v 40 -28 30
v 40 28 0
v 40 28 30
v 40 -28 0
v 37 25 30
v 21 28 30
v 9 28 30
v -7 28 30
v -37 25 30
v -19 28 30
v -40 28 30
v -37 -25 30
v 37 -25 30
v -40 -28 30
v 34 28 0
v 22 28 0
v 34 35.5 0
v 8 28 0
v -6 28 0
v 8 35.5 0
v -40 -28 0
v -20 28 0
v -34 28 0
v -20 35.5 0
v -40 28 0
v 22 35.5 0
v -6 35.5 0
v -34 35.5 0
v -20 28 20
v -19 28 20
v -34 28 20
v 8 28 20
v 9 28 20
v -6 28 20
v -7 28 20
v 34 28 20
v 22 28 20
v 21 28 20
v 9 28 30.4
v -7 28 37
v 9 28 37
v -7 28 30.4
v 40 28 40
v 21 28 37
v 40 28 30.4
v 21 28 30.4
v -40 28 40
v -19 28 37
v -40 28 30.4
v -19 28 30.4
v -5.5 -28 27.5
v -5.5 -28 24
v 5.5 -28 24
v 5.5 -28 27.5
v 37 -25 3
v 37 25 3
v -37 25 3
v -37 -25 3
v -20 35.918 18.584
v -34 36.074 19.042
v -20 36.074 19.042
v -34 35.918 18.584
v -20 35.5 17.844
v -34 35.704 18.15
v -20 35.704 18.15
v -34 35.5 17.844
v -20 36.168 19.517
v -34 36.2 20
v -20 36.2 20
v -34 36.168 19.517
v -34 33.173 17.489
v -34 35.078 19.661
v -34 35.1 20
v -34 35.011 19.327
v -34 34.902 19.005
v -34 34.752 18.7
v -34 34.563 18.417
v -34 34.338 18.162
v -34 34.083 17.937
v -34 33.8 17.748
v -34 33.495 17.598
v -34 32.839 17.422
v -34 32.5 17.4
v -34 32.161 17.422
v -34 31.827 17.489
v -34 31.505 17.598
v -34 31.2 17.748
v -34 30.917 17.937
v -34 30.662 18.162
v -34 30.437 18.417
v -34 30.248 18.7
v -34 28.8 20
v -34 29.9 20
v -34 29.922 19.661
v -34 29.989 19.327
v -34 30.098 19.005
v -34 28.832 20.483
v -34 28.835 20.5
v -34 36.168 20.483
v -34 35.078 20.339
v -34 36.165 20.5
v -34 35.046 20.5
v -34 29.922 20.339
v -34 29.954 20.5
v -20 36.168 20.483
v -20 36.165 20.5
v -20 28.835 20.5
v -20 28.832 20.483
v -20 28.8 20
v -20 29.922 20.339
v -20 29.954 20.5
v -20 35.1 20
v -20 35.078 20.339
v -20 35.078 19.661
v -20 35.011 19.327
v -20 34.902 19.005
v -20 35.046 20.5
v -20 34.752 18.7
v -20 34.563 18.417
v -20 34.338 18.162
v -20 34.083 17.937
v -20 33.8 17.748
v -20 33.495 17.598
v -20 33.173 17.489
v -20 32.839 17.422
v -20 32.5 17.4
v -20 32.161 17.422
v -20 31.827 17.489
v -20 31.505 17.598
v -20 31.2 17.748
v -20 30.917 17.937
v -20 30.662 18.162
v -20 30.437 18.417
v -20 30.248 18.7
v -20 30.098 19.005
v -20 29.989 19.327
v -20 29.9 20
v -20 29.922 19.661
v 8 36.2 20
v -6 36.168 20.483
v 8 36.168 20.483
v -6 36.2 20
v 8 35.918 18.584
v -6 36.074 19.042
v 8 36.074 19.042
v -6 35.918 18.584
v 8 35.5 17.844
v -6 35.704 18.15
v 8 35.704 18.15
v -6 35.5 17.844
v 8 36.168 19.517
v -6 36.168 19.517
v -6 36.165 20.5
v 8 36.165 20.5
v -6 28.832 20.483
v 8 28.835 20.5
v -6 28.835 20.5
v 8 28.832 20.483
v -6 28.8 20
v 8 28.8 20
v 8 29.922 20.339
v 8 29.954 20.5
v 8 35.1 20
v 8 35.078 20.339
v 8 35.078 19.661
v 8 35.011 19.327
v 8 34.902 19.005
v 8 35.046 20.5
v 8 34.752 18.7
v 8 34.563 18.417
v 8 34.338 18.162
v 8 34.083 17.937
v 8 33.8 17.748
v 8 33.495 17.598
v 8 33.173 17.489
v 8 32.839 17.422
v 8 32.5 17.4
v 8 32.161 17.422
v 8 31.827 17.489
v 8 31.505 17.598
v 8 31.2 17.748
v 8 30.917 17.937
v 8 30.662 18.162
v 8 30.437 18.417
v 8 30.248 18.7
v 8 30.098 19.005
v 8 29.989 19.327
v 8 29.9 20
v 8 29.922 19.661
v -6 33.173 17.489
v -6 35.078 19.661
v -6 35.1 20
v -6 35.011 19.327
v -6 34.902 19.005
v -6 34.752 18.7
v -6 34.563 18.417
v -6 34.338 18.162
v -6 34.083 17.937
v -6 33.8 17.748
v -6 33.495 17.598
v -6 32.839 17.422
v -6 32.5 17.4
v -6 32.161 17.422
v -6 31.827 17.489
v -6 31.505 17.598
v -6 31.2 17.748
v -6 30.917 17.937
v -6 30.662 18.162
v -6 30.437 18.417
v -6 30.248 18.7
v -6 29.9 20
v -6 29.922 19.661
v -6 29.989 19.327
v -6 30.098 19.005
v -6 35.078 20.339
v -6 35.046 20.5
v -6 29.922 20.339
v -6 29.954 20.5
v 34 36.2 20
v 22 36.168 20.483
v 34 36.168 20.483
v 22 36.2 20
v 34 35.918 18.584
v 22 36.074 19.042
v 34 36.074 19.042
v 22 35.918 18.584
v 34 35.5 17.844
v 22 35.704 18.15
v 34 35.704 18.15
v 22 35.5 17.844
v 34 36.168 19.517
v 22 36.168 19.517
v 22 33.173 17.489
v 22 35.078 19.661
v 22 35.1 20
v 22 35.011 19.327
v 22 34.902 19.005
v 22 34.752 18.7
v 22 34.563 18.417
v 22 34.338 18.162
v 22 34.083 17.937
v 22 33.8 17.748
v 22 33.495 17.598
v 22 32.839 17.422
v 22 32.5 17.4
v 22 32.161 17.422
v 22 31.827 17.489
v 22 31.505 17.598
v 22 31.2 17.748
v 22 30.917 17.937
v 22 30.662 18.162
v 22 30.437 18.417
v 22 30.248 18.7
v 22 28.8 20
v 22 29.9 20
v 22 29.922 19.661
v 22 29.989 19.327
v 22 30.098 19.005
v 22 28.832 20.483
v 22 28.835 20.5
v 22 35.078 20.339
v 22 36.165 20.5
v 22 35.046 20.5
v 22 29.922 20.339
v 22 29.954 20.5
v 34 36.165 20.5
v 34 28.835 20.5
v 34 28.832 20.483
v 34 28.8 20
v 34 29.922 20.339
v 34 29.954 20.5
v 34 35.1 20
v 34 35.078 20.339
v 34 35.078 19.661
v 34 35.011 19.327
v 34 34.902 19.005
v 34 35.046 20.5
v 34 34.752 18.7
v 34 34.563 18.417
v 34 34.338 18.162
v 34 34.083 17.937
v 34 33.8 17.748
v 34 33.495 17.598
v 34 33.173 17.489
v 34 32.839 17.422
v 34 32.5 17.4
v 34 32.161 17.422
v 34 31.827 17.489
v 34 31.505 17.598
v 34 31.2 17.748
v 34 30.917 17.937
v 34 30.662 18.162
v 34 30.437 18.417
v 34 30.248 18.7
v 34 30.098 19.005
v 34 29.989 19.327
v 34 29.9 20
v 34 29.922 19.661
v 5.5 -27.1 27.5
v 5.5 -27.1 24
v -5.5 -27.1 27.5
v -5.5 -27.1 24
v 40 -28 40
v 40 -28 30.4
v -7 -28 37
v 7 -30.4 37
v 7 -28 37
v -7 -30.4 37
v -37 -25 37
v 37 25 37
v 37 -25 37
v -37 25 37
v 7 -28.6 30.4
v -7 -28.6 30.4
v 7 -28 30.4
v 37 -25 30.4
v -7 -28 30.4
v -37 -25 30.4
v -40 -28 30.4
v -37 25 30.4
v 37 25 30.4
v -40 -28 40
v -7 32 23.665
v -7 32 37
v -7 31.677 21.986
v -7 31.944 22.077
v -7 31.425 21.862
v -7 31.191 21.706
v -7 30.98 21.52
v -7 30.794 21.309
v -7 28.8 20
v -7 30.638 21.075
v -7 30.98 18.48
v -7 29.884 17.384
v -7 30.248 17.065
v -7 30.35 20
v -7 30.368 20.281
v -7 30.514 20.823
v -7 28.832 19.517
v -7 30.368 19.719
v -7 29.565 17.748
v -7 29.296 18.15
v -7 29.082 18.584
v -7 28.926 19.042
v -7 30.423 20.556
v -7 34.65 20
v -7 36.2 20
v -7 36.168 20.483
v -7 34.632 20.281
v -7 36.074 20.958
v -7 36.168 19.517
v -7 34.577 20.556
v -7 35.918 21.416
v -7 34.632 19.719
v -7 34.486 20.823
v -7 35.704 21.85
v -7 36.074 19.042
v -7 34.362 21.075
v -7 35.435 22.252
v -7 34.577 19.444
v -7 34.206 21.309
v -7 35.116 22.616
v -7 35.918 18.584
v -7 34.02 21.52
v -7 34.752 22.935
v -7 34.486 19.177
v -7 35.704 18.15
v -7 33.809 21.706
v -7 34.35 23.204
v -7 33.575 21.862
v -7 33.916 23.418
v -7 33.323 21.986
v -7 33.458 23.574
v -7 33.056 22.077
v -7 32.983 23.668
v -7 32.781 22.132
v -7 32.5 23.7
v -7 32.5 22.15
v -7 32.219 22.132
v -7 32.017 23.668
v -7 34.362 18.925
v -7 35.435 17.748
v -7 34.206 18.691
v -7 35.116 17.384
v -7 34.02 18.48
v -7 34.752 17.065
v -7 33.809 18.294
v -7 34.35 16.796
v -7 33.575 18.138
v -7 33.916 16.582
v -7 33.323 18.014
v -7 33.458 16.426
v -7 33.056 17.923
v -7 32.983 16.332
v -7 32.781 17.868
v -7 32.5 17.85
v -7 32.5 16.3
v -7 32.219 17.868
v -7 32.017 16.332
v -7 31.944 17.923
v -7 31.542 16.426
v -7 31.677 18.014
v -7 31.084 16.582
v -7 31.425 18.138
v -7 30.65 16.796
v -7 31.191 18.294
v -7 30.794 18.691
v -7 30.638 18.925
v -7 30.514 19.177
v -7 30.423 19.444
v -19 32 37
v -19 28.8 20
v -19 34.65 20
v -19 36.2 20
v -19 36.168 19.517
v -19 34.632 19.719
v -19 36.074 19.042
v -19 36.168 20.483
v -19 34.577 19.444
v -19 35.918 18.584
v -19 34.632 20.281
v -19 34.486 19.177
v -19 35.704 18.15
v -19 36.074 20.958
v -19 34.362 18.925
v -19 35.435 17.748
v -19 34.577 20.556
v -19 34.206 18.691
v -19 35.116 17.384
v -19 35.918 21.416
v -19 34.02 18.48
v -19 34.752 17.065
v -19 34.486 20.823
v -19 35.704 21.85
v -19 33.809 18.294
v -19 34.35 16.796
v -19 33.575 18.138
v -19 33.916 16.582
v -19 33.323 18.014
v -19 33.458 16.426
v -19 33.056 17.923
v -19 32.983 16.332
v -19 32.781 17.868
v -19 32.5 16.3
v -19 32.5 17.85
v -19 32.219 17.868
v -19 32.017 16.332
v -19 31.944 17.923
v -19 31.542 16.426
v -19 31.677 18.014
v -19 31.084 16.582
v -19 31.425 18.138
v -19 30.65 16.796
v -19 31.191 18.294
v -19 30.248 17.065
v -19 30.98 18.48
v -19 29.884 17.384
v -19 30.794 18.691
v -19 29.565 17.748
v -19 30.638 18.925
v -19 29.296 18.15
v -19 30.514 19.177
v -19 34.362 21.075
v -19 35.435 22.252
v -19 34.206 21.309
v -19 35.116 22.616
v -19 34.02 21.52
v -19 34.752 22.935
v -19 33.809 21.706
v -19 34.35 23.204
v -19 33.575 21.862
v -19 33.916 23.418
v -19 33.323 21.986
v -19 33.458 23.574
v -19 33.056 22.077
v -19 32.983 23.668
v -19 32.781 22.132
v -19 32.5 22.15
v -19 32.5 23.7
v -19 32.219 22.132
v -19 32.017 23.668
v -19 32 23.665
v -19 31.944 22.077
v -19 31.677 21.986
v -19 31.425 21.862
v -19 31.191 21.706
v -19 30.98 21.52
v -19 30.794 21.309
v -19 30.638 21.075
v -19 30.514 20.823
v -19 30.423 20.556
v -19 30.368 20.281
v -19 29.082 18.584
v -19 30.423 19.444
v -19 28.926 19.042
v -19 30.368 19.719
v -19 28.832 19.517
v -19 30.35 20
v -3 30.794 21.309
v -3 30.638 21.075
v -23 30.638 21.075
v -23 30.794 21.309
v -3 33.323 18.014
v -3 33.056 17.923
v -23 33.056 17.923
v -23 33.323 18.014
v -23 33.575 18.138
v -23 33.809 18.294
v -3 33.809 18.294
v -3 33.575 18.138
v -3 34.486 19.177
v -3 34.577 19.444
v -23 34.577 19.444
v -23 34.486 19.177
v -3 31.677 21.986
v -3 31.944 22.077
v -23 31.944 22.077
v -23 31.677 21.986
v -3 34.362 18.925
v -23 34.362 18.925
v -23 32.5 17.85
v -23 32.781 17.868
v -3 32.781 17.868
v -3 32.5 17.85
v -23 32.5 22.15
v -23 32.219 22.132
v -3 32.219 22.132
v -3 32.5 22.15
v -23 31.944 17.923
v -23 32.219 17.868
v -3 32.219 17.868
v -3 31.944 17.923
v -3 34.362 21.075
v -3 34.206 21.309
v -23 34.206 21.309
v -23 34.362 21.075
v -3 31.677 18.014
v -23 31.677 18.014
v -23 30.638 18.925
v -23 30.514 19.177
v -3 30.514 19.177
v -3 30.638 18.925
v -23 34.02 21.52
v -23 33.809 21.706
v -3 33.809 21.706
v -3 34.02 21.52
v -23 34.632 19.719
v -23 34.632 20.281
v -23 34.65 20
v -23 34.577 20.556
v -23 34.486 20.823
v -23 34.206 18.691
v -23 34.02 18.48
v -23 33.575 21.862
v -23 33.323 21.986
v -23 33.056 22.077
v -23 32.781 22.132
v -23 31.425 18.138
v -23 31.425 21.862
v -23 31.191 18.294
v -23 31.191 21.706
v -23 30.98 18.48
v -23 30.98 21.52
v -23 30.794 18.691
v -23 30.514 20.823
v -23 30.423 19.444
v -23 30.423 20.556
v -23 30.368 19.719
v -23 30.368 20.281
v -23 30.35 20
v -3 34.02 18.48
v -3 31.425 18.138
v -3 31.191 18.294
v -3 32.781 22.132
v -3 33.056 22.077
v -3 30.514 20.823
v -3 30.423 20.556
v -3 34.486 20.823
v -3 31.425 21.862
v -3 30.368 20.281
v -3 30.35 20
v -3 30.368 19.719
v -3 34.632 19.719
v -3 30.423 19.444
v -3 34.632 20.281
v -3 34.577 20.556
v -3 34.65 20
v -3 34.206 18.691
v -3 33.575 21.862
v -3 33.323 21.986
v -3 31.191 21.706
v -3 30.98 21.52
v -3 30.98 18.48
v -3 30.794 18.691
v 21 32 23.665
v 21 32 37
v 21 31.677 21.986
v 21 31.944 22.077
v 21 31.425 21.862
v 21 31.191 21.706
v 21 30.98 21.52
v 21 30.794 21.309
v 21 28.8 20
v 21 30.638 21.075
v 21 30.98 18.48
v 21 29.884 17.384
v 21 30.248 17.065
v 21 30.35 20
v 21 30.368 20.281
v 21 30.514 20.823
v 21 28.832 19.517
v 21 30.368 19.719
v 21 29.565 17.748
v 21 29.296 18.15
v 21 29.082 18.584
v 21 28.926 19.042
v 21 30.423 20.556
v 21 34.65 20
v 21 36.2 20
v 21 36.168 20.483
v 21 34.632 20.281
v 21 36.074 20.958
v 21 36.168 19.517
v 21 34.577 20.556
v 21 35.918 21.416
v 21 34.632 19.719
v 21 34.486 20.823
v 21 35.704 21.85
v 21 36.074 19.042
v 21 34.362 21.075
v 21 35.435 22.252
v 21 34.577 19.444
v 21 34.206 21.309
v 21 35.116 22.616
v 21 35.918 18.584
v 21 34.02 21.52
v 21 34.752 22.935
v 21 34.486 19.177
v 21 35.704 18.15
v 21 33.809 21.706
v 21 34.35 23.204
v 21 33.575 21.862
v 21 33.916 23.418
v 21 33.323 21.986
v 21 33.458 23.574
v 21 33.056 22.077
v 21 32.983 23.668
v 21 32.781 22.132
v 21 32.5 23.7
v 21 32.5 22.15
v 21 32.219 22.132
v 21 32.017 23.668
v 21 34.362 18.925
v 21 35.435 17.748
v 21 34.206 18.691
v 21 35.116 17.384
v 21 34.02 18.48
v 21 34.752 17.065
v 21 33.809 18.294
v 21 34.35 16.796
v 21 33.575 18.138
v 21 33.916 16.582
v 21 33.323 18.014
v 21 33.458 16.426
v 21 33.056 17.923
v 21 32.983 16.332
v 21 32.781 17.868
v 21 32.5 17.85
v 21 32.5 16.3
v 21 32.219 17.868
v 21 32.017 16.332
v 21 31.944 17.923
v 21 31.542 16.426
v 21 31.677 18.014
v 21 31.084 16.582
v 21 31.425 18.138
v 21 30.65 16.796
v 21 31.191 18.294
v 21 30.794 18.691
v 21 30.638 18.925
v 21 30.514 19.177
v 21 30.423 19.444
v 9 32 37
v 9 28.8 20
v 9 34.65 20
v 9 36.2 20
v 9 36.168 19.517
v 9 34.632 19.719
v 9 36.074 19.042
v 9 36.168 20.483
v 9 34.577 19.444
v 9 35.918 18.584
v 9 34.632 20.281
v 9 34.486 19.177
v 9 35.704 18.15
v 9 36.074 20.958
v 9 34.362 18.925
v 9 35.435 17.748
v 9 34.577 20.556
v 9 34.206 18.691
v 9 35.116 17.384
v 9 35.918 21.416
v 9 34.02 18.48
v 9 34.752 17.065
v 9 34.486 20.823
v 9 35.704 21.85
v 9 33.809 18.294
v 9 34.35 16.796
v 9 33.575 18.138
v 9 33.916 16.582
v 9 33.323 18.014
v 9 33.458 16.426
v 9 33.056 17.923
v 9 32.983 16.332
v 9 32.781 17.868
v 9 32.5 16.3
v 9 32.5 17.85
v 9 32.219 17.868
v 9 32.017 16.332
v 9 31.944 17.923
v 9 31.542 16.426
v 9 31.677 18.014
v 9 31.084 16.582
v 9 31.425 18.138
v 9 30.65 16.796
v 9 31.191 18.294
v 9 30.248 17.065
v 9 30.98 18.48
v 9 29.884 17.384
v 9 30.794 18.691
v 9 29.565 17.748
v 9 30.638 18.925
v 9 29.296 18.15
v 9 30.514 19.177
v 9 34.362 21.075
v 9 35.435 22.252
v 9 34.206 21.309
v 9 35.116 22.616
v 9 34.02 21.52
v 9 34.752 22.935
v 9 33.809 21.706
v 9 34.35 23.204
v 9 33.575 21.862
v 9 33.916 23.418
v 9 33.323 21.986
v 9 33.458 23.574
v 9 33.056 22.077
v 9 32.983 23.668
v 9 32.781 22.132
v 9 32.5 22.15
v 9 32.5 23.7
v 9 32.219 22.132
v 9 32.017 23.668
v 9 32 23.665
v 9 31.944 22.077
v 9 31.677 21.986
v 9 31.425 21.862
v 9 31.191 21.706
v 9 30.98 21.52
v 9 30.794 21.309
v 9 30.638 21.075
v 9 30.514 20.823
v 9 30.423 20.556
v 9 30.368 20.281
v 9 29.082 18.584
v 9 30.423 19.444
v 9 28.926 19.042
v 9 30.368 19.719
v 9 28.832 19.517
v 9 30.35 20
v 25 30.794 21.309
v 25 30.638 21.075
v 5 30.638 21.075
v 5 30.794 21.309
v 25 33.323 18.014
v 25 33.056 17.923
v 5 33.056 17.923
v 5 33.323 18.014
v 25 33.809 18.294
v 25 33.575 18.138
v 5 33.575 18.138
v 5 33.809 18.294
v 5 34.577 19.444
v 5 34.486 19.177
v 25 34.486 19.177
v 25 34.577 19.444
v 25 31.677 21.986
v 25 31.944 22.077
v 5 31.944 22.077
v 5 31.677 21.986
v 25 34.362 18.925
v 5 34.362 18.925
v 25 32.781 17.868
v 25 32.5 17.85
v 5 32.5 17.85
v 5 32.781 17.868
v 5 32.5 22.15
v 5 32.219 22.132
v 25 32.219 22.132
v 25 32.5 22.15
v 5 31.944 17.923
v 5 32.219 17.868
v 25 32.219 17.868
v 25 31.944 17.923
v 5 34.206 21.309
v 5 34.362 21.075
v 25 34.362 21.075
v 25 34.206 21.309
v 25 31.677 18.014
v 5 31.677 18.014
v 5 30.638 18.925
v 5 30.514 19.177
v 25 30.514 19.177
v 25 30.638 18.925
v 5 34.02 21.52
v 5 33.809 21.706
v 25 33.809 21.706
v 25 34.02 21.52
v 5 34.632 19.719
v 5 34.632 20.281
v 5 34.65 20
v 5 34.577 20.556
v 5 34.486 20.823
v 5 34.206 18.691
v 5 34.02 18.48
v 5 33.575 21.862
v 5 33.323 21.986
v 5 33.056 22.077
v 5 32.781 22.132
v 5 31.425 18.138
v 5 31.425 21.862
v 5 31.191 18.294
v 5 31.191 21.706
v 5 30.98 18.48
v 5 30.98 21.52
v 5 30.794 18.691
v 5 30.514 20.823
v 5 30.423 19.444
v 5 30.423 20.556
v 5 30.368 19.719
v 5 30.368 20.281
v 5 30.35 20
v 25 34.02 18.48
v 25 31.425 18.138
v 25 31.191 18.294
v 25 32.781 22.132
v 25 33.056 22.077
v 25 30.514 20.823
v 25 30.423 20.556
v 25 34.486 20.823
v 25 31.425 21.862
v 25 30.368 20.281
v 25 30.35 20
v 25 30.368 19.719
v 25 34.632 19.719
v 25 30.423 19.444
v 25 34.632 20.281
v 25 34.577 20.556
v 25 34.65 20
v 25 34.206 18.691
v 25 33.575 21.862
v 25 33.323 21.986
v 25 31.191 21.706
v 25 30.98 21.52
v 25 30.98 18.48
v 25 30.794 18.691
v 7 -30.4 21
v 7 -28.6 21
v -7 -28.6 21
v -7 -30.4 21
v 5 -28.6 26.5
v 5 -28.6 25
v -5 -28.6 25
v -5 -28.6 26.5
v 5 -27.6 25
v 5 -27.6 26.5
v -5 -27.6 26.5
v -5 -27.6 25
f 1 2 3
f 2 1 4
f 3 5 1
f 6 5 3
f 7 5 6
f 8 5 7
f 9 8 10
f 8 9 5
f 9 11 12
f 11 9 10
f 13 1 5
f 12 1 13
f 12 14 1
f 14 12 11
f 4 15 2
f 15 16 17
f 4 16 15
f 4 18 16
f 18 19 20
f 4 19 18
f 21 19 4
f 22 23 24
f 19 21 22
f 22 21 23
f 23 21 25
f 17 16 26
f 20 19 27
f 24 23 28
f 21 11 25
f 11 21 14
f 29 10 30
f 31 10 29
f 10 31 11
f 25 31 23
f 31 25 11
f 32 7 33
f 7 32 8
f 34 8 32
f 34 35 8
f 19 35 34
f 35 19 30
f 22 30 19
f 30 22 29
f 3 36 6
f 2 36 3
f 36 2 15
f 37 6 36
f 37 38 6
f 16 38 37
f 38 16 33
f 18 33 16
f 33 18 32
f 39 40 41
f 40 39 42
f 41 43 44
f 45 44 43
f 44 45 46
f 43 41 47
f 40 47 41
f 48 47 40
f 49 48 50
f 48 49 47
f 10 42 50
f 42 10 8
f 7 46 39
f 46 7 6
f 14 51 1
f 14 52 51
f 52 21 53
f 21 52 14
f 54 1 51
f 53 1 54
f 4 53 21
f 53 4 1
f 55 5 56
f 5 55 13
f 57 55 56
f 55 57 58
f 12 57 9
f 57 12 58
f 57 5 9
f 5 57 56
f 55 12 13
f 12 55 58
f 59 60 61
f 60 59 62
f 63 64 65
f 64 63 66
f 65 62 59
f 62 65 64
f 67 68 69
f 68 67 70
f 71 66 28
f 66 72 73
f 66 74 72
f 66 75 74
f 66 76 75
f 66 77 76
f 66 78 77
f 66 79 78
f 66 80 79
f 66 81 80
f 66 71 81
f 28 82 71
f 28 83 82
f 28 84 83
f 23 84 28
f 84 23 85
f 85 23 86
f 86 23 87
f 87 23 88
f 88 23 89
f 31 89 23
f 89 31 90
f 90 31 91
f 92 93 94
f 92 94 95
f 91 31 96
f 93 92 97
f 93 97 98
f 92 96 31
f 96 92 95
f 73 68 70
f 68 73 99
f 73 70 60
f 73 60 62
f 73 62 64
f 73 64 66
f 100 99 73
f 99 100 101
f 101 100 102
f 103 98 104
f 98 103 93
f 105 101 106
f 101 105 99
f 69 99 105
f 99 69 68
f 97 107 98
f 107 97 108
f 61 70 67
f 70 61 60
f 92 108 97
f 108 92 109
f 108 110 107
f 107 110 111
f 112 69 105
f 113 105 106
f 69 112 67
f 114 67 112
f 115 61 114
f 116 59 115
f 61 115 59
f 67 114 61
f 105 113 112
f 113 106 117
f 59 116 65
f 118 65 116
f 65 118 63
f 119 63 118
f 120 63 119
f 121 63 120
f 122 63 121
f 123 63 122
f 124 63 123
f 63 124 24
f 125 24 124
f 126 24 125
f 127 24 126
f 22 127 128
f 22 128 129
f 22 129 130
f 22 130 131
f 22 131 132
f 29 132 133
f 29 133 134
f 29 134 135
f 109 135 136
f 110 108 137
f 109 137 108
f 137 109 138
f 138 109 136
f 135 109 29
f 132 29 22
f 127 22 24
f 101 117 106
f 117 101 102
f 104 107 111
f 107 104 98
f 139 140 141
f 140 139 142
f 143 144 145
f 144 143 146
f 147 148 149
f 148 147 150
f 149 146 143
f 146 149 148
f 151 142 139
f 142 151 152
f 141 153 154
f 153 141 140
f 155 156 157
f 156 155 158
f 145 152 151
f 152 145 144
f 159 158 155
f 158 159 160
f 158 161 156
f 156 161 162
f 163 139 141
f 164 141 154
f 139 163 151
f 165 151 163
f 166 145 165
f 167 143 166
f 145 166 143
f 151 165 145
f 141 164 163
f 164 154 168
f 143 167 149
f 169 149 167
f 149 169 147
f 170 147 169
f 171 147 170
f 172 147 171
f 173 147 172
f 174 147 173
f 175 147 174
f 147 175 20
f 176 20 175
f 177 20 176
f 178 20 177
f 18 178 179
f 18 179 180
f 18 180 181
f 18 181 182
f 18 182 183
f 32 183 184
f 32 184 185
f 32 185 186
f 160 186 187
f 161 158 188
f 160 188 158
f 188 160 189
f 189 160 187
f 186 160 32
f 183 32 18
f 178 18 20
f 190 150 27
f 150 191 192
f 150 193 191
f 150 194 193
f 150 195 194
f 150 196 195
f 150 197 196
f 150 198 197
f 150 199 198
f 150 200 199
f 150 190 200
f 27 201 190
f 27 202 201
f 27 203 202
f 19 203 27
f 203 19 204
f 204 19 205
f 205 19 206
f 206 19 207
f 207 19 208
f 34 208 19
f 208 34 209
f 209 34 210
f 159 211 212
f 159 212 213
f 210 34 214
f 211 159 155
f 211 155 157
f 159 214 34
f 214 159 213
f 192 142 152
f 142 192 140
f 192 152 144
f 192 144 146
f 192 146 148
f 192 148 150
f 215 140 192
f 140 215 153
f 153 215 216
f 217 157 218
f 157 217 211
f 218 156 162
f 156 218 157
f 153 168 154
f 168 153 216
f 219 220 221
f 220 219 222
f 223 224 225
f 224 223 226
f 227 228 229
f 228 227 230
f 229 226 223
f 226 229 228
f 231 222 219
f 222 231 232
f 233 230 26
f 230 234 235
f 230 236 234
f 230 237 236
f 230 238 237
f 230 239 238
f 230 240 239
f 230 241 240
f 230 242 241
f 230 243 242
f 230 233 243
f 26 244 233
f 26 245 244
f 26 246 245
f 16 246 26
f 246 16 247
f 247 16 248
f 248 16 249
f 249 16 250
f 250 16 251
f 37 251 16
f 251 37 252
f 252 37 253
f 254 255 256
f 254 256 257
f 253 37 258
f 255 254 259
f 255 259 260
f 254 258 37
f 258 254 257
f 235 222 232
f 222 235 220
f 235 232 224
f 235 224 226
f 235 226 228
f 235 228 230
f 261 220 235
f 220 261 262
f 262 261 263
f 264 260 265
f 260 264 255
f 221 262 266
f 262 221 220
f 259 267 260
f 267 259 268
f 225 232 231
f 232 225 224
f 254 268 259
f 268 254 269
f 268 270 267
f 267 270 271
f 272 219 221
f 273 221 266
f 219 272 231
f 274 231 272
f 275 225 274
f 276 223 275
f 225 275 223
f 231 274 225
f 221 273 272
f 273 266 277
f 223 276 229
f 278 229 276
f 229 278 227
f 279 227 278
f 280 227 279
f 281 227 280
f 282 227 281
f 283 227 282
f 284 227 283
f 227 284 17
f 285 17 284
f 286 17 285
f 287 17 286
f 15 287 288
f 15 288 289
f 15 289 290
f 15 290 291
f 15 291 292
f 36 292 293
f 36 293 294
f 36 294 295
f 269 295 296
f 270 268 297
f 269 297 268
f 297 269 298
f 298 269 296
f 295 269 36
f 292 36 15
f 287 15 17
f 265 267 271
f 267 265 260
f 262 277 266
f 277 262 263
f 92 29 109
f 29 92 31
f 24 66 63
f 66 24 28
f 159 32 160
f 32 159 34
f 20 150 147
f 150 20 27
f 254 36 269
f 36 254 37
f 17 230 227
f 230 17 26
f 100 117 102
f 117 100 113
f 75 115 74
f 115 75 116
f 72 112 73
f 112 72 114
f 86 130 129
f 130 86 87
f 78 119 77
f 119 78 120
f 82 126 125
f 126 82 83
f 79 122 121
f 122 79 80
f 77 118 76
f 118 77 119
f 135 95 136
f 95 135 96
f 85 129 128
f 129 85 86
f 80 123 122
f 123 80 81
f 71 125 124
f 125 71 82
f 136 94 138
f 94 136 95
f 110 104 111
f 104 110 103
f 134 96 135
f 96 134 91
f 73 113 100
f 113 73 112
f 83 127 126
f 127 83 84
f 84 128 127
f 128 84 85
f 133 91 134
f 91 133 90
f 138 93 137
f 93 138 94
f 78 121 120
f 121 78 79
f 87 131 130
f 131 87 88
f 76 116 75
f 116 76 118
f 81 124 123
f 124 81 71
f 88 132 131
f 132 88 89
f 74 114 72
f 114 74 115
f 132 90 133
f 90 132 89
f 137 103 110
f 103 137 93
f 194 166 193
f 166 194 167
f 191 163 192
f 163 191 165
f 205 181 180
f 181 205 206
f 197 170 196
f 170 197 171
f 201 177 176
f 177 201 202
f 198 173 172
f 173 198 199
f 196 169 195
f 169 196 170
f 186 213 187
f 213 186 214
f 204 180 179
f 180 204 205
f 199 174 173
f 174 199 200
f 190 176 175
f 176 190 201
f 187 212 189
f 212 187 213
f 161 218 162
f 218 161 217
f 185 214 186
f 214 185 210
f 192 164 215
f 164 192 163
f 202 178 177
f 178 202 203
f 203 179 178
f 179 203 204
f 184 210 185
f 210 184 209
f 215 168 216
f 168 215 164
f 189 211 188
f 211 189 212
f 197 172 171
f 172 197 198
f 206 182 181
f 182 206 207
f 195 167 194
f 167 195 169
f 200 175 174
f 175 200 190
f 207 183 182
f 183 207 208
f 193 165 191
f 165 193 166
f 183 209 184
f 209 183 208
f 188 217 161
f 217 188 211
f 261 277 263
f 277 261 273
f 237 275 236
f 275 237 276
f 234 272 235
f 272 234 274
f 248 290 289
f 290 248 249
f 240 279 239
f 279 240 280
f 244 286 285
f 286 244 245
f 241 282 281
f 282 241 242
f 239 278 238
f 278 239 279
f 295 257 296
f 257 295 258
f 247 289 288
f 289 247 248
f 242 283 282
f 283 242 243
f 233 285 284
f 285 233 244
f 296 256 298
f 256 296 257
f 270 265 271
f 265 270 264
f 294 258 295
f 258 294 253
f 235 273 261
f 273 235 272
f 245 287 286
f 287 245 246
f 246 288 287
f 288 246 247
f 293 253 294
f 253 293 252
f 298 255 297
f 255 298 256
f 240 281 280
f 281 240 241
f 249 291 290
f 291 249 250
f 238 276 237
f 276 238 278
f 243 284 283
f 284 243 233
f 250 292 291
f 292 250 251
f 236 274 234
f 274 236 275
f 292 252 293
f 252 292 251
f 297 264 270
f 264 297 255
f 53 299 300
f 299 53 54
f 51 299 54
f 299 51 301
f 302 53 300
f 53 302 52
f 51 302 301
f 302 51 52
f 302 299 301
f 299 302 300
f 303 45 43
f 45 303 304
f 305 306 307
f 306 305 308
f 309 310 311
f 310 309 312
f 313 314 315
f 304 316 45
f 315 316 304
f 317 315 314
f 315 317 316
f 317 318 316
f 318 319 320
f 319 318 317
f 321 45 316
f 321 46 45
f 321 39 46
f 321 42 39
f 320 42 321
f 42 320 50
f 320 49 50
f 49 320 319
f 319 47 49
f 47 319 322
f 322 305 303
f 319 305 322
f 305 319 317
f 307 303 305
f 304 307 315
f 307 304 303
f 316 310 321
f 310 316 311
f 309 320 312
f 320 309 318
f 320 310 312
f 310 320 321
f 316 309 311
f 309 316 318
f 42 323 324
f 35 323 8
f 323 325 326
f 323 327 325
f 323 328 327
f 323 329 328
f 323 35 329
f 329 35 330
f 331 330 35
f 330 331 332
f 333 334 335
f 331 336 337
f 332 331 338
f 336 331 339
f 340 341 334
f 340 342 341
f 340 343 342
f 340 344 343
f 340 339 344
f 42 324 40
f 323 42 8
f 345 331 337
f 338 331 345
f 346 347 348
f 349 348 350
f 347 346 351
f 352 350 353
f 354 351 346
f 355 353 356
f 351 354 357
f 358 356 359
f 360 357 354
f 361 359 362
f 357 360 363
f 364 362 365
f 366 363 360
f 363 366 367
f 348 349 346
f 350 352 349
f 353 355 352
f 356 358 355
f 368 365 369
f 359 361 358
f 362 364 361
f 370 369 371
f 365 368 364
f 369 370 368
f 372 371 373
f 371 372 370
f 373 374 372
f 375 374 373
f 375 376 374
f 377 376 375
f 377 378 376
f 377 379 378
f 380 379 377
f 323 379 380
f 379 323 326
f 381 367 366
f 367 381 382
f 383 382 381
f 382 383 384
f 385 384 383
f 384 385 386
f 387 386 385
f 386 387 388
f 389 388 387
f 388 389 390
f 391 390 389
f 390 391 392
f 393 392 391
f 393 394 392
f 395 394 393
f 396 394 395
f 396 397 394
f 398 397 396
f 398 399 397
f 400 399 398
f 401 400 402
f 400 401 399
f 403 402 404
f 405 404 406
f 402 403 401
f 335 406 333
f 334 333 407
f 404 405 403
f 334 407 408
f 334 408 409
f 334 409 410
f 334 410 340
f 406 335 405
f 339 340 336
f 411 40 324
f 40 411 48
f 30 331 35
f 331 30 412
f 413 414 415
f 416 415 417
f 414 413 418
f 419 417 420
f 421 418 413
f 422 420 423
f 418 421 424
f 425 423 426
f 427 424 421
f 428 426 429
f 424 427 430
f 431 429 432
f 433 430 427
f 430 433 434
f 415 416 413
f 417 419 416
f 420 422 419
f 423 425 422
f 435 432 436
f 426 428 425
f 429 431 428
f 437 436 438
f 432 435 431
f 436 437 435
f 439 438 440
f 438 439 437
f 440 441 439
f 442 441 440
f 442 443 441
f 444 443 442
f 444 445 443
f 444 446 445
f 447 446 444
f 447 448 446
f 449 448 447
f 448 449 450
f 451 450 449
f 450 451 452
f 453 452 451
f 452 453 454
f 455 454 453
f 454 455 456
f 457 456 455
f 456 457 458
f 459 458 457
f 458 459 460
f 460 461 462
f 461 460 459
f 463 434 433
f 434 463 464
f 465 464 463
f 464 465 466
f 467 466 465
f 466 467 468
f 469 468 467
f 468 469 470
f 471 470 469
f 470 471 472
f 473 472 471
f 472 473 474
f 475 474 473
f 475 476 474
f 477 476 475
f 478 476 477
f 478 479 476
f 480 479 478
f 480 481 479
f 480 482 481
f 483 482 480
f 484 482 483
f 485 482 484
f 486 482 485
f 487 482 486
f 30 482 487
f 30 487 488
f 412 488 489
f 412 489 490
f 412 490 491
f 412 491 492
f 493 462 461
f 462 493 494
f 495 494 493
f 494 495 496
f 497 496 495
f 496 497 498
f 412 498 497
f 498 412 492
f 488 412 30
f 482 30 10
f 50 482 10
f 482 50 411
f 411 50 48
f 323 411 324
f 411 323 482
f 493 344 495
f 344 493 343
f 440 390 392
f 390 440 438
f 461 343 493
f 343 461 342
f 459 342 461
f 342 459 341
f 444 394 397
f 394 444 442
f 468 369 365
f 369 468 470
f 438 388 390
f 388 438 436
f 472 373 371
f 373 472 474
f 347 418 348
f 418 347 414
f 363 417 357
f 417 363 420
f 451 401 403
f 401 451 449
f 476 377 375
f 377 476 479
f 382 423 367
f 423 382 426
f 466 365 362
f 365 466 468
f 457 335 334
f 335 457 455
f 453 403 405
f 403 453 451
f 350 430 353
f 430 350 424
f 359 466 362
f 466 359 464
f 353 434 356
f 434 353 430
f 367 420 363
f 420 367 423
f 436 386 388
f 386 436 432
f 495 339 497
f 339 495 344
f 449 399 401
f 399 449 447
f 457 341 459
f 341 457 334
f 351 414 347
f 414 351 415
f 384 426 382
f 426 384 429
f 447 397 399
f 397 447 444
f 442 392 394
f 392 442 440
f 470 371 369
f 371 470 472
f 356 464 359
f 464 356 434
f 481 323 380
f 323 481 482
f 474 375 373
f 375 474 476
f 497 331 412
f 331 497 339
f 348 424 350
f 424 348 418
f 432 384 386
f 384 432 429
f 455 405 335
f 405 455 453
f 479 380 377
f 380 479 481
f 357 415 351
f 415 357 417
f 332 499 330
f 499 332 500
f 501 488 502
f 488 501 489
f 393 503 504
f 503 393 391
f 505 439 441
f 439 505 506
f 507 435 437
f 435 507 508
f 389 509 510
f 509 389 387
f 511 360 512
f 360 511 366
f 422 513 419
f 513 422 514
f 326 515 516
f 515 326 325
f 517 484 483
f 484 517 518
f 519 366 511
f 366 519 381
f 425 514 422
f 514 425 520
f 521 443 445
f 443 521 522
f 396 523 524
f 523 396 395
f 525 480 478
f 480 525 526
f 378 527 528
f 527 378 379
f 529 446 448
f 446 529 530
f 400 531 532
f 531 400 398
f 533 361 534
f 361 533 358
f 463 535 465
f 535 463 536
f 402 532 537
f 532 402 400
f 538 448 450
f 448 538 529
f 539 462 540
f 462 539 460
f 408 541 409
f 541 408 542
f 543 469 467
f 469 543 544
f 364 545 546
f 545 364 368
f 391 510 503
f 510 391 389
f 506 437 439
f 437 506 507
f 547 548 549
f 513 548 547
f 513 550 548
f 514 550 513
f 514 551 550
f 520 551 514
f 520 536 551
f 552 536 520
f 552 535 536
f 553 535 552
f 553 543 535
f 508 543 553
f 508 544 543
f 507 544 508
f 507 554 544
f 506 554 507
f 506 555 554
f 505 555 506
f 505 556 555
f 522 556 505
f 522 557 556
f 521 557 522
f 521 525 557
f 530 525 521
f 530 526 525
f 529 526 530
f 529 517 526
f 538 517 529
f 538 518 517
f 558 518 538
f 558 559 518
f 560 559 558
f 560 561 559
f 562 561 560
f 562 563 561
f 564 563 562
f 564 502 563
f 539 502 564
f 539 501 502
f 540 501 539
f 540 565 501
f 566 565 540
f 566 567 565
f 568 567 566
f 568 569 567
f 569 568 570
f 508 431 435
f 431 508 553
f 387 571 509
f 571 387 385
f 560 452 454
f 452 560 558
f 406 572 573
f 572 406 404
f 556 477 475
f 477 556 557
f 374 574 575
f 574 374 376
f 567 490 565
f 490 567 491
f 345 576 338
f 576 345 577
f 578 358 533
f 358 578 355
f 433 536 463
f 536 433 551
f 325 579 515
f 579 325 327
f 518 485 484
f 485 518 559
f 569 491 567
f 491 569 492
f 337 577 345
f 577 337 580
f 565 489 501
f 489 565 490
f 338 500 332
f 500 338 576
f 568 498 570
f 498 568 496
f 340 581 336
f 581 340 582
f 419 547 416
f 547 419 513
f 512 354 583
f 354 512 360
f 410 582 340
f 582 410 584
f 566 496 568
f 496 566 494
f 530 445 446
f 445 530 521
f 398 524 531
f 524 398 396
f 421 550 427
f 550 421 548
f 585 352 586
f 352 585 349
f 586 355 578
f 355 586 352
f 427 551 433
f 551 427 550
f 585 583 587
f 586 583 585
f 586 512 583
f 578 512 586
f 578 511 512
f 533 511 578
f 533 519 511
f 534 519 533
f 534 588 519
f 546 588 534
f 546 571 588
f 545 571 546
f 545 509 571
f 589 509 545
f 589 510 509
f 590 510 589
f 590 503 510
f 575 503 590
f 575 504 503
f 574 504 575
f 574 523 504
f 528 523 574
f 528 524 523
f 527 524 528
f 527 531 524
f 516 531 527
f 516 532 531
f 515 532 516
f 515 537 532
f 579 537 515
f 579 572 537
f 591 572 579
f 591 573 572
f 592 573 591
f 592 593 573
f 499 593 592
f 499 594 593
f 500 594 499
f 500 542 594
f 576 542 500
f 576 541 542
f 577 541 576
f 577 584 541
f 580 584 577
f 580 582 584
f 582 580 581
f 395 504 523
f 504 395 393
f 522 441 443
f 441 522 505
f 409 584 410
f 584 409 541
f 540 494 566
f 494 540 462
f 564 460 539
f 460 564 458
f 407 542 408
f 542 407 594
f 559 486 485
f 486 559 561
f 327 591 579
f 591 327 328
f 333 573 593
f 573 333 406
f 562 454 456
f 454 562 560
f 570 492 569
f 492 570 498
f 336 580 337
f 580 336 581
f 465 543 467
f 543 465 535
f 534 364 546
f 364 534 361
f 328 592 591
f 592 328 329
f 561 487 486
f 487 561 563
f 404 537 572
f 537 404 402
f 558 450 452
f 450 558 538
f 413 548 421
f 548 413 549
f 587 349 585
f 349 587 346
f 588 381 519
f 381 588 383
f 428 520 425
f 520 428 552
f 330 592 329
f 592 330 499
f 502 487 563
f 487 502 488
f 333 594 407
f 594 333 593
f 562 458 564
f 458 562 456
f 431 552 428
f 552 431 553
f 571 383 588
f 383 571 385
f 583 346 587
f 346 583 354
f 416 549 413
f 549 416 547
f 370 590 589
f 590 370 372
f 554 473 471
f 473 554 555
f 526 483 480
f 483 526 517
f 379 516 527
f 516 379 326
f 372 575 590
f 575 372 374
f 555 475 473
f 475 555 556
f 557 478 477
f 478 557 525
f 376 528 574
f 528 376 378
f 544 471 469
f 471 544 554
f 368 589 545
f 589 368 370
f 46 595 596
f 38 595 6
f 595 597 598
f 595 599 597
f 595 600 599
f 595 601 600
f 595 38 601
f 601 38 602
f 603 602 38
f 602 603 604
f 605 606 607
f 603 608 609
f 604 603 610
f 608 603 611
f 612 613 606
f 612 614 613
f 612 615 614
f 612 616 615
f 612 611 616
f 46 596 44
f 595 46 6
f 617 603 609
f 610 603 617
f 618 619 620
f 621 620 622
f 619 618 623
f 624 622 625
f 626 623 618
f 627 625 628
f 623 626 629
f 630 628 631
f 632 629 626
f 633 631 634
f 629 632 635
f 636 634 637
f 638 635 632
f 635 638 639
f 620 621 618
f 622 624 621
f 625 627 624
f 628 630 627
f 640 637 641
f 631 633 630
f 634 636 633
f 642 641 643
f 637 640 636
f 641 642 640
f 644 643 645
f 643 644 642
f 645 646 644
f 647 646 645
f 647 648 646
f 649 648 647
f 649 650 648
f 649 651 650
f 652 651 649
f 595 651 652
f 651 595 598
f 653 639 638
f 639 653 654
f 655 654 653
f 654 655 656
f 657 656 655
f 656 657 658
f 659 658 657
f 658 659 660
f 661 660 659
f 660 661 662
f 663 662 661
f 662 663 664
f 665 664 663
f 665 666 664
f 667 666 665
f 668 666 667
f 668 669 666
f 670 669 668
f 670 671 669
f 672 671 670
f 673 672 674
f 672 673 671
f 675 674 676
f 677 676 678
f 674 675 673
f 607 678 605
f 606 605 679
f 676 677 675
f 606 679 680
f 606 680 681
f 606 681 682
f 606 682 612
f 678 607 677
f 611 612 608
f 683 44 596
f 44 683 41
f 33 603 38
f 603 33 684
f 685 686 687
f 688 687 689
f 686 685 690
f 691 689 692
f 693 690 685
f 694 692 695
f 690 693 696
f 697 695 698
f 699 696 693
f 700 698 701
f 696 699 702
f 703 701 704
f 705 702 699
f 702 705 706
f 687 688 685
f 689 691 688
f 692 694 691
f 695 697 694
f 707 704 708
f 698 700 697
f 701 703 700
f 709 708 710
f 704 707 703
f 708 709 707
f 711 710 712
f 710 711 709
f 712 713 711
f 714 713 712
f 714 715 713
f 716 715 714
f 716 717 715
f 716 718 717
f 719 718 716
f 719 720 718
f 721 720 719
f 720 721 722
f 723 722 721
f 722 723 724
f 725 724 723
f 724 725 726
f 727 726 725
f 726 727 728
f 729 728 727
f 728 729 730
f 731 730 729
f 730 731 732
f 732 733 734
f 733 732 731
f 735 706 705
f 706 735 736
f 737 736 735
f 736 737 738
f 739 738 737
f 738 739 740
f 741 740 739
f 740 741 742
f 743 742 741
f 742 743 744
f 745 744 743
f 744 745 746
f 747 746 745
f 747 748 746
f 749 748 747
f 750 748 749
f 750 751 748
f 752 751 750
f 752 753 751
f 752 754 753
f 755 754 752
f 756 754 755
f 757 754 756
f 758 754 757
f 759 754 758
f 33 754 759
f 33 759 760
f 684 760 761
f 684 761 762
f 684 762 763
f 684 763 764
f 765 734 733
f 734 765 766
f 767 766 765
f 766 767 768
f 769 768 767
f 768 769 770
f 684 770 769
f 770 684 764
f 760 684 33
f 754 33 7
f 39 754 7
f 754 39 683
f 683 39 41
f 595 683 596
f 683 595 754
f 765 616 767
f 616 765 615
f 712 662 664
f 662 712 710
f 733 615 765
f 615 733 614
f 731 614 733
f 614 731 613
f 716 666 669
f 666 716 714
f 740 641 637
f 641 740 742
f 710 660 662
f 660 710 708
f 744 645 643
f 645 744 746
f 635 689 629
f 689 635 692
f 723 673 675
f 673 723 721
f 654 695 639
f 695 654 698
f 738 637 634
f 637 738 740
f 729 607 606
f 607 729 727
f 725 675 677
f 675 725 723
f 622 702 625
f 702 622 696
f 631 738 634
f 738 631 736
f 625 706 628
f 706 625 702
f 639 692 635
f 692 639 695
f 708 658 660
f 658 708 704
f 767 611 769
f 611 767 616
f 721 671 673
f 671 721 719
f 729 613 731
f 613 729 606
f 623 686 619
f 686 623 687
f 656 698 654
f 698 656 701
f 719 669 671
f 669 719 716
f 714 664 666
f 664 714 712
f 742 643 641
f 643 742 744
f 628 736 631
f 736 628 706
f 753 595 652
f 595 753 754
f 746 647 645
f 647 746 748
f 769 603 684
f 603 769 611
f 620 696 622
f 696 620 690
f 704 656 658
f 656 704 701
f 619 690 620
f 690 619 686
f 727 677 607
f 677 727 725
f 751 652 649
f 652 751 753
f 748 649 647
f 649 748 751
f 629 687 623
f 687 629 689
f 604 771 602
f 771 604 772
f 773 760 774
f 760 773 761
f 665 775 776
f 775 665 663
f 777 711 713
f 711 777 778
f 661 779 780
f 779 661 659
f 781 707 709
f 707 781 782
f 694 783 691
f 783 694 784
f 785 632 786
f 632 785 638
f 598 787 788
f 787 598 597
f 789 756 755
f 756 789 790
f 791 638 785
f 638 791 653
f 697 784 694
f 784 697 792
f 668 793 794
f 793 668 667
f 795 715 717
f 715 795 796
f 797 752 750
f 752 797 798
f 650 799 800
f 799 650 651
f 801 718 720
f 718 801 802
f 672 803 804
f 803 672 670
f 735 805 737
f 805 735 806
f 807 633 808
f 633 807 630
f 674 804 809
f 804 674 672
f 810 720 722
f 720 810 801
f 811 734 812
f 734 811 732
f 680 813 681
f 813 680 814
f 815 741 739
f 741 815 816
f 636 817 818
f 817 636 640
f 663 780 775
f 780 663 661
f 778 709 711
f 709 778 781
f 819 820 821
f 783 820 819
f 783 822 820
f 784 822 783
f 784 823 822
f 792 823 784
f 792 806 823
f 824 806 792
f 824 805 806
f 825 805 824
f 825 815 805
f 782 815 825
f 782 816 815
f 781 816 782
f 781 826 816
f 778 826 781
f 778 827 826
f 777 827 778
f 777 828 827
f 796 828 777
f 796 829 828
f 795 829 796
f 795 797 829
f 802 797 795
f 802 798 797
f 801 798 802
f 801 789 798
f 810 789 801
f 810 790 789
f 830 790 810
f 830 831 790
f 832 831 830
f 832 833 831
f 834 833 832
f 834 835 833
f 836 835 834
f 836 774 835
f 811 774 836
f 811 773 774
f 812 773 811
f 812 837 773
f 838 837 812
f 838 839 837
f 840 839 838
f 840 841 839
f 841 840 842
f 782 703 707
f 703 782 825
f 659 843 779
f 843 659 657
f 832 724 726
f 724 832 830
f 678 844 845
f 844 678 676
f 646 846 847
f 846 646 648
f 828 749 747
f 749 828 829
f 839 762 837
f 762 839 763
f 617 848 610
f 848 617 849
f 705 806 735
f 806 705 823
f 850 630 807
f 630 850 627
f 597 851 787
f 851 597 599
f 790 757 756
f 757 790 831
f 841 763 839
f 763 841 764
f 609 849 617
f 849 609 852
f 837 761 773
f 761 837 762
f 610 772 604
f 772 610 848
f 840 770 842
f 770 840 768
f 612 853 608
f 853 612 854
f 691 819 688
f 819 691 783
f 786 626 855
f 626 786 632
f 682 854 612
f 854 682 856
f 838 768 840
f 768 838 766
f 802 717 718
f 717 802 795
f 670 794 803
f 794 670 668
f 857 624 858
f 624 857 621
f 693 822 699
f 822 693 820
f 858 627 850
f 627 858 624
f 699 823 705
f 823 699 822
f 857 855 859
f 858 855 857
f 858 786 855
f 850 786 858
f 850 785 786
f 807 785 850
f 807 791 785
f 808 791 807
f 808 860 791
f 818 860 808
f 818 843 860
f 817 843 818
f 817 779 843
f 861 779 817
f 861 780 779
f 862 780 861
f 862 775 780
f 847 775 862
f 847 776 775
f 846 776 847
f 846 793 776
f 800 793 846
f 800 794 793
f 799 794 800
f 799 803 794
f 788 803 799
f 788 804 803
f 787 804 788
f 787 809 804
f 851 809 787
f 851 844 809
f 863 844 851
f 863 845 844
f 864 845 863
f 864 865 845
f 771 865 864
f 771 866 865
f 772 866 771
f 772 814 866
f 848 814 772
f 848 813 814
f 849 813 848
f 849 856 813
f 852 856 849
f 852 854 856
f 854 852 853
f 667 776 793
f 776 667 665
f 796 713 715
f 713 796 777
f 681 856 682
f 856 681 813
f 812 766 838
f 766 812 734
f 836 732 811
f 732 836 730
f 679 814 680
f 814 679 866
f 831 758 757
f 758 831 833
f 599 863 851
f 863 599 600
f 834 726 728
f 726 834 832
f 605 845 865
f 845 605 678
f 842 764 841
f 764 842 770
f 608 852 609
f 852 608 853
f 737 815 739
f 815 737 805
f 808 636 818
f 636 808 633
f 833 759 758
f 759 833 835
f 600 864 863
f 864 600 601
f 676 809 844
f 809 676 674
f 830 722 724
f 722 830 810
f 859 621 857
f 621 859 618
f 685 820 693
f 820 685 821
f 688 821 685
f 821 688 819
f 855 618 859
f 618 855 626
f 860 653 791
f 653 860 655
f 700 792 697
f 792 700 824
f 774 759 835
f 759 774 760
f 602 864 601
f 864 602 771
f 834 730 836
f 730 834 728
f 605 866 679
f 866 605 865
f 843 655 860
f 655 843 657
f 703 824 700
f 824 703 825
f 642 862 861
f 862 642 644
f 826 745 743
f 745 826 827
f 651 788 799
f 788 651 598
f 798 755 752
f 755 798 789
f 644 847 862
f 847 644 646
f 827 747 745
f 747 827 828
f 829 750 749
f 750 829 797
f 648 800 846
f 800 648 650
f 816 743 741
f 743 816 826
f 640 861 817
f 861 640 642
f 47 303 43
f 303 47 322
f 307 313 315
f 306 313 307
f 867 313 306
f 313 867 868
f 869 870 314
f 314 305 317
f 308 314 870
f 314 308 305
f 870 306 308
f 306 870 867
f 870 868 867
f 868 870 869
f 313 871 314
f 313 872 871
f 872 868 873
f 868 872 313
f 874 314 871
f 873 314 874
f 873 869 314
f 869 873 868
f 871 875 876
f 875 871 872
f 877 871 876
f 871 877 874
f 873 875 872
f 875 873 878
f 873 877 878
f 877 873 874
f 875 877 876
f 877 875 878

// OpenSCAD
// Print-in-place hinged box, 80 x ~65 x 40 mm closed (80 x 56 body + hinge/catch)
// Parts: base, lid, pin.  Assembly = closed box.  Print pose = lid open 180 deg,
// lying flat behind the base, both trays opening up, pin captive in the knuckles.
part = "assembly"; // [assembly, base, lid]
cadverify_only = "";
module instance(name, p, unit = 1) {
    echo(cadverify_instance = [name, p, unit]);
    if (cadverify_only == "" || cadverify_only == name) children();
}
$fn = 48;
// ---- dimensions (assembly / closed coordinates) ----
W = 80; D = 56; base_h = 30; lid_top = 40; wall = 3;
ax_y = 32.5; ax_z = 20;            // hinge axis, 0.8 mm behind rear wall (y=28)
r_out = 3.7; r_bore = 2.6; r_stub = 2.15; // lid pin stubs, 0.45 radial clearance in base bores
base_segs = [[-34, -20], [-6, 8], [22, 34]];
lid_segs  = [[-19, -7], [9, 21]];
module cylx(x0, len, r) translate([x0, 0, 0]) rotate([0, 90, 0]) cylinder(h = len, r = r);
module base_closed() {
    difference() {
        union() {
            difference() {
                translate([-40, -28, 0]) cube([80, 56, 30]);
                translate([-37, -25, 3]) cube([74, 50, 30]);
            }
            for (s = base_segs) {
                translate([s[0], 27, 0]) cube([s[1] - s[0], 8.5, 20]); // pillar to bed, supports knuckle
                intersection() { // open-top cradle (lower knuckle): lid stub drops in, no enclosed bore
                    translate([0, ax_y, ax_z]) cylx(s[0], s[1] - s[0], r_out);
                    translate([s[0], ax_y - 4, ax_z - 4]) cube([s[1] - s[0], 8, 4.5]);
                }
            }
        }
        for (s = base_segs) translate([0, ax_y, ax_z]) cylx(s[0] - 1, s[1] - s[0] + 2, r_bore);
        translate([-5.5, -29, 24]) cube([11, 1.9, 3.5]); // catch pocket, front wall
    }
}
module lid_closed() {
    union() {
            translate([-40, -28, 37]) cube([80, 56, 3]);               // top panel
            difference() {                                              // skirt
                translate([-40, -28, 30.4]) cube([80, 56, 6.6]);
                translate([-37, -25, 29]) cube([74, 50, 8]);
            }
            for (s = lid_segs) {
                translate([s[0], 28, 20]) cube([s[1] - s[0], 4, 17]);  // hinge strap
                translate([0, ax_y, ax_z]) cylx(s[0], s[1] - s[0], r_out);
                translate([0, ax_y, ax_z]) cylx(s[0] - 4, s[1] - s[0] + 8, r_stub); // integral pin stubs into base cradles
            }
            translate([-7, -30.4, 30.4]) cube([14, 2.4, 6.6]);          // catch spacer
            translate([-7, -30.4, 21]) cube([14, 1.8, 12]);             // catch tab
            translate([-5, -28.6, 25.0]) cube([10, 1.0, 1.5]);          // catch bump (smaller, less snap penetration)
    }
}
module lid_print() translate([0, -28.8, 0]) translate([0, ax_y, ax_z])
    rotate([180, 0, 0]) translate([0, -ax_y, -ax_z]) lid_closed();
// ---- specs (exported-part coordinates) ----
if (part == "base") echo(cadverify_spec = [
    ["bounds", [[-40, -28, 0], [40, 36.2, 30]]], ["bodies", 1], ["through_holes", 0],
    ["support_faces", [["bed", "-z", 4000]]],
    ["overhangs_allowed", [["hinge cradle groove, pillars rise to the knuckles from the bed", [[-40, 26, 14], [40, 37, 24]]],
                            ["catch pocket ceiling", [[-8, -29, 23], [8, -26, 29]]]]],
    ["copies", 1],
    ["details", [
        ["floor", "material", [[-37, -25, 0], [37, 25, 3]], 0.95],
        ["cavity", "void", [[-36, -24, 10], [36, 24, 29]], 0.98],
        ["base_knuckle", "material", [[-30, 34.8, 19], [-24, 35.8, 20]], 0.7],
        ["cradle_groove", "void", [[-30, 31.8, 19.3], [-24, 33.2, 20.7]], 0.95],
        ["front_wall", "thickness", [0, -35, 15], [0, 1, 0], 3]
    ]]]);
if (part == "lid") echo(cadverify_spec = [
    ["bounds", [[-40, 0, 0], [40, 66.6, 23.7]]], ["bodies", 1], ["through_holes", 1],
    ["support_faces", [["bed", "-z", 4000]]],
    ["overhangs_allowed", [["strap and hinge knuckle undersides, within 5 mm of the panel edge and straps", [[-40, 0, 2], [40, 10, 24]]],
                            ["catch tab and bump undersides", [[-8, 62, 2], [8, 67, 20]]]]],
    ["copies", 1],
    ["details", [
        ["panel", "material", [[-37, 10, 0], [37, 60, 3]], 0.95],
        ["tray_cavity", "void", [[-35, 14, 3.5], [35, 57, 9]], 0.95],
        ["strap", "material", [[10, 5, 10], [20, 7.5, 18]], 0.85],
        ["panel_thickness", "thickness", [0, 35, -5], [0, 0, 1], 3],
        ["catch_tab", "view", [[-8, 64, 6], [8, 67, 20]]]
    ]]]);
if (part == "assembly") echo(cadverify_spec = [
    ["bounds", [[-40, -30.4, 0], [40, 36.2, 40]]],
    ["support_faces", [["bed", "-z", 4000]]],
    ["allowed_interferences", []],
    ["motions", [["lid_open", ["lid"], "rotate", [0, 32.5, 20], [-1, 0, 0], [0, 180],
        ["flex", [["lid", "base", 1.0, "catch bump snaps out of its pocket and tab flexes"]]]]]],
    ["assembly_order", [
        [["base"], [0, 0, 0]],
        [["lid"], [0, 0, -1], ["rotate", [0, 32.5, 20], [-1, 0, 0], 180]]
    ]],
    ["print_in_place", 0.4],
    ["print_pose", [["lid_open", 180]]],
    ["overhangs_allowed", [["hinge cradles, knuckles, straps and pin stubs, supported by pillars, panel edge and straps within 5 mm", [[-40, 27, 2], [40, 38, 26]]],
                            ["catch tab, spacer and bump in print pose", [[-8, 88, 2], [8, 96, 20]]],
                            ["catch pocket ceiling", [[-8, -31, 20], [8, -26, 29]]]]]
]);
// ---- output ----
if (part == "base") base_closed();
else if (part == "lid") lid_print();
else if (part == "assembly") {
    instance("base", "base") base_closed();
    instance("lid", "lid") lid_closed();
}
